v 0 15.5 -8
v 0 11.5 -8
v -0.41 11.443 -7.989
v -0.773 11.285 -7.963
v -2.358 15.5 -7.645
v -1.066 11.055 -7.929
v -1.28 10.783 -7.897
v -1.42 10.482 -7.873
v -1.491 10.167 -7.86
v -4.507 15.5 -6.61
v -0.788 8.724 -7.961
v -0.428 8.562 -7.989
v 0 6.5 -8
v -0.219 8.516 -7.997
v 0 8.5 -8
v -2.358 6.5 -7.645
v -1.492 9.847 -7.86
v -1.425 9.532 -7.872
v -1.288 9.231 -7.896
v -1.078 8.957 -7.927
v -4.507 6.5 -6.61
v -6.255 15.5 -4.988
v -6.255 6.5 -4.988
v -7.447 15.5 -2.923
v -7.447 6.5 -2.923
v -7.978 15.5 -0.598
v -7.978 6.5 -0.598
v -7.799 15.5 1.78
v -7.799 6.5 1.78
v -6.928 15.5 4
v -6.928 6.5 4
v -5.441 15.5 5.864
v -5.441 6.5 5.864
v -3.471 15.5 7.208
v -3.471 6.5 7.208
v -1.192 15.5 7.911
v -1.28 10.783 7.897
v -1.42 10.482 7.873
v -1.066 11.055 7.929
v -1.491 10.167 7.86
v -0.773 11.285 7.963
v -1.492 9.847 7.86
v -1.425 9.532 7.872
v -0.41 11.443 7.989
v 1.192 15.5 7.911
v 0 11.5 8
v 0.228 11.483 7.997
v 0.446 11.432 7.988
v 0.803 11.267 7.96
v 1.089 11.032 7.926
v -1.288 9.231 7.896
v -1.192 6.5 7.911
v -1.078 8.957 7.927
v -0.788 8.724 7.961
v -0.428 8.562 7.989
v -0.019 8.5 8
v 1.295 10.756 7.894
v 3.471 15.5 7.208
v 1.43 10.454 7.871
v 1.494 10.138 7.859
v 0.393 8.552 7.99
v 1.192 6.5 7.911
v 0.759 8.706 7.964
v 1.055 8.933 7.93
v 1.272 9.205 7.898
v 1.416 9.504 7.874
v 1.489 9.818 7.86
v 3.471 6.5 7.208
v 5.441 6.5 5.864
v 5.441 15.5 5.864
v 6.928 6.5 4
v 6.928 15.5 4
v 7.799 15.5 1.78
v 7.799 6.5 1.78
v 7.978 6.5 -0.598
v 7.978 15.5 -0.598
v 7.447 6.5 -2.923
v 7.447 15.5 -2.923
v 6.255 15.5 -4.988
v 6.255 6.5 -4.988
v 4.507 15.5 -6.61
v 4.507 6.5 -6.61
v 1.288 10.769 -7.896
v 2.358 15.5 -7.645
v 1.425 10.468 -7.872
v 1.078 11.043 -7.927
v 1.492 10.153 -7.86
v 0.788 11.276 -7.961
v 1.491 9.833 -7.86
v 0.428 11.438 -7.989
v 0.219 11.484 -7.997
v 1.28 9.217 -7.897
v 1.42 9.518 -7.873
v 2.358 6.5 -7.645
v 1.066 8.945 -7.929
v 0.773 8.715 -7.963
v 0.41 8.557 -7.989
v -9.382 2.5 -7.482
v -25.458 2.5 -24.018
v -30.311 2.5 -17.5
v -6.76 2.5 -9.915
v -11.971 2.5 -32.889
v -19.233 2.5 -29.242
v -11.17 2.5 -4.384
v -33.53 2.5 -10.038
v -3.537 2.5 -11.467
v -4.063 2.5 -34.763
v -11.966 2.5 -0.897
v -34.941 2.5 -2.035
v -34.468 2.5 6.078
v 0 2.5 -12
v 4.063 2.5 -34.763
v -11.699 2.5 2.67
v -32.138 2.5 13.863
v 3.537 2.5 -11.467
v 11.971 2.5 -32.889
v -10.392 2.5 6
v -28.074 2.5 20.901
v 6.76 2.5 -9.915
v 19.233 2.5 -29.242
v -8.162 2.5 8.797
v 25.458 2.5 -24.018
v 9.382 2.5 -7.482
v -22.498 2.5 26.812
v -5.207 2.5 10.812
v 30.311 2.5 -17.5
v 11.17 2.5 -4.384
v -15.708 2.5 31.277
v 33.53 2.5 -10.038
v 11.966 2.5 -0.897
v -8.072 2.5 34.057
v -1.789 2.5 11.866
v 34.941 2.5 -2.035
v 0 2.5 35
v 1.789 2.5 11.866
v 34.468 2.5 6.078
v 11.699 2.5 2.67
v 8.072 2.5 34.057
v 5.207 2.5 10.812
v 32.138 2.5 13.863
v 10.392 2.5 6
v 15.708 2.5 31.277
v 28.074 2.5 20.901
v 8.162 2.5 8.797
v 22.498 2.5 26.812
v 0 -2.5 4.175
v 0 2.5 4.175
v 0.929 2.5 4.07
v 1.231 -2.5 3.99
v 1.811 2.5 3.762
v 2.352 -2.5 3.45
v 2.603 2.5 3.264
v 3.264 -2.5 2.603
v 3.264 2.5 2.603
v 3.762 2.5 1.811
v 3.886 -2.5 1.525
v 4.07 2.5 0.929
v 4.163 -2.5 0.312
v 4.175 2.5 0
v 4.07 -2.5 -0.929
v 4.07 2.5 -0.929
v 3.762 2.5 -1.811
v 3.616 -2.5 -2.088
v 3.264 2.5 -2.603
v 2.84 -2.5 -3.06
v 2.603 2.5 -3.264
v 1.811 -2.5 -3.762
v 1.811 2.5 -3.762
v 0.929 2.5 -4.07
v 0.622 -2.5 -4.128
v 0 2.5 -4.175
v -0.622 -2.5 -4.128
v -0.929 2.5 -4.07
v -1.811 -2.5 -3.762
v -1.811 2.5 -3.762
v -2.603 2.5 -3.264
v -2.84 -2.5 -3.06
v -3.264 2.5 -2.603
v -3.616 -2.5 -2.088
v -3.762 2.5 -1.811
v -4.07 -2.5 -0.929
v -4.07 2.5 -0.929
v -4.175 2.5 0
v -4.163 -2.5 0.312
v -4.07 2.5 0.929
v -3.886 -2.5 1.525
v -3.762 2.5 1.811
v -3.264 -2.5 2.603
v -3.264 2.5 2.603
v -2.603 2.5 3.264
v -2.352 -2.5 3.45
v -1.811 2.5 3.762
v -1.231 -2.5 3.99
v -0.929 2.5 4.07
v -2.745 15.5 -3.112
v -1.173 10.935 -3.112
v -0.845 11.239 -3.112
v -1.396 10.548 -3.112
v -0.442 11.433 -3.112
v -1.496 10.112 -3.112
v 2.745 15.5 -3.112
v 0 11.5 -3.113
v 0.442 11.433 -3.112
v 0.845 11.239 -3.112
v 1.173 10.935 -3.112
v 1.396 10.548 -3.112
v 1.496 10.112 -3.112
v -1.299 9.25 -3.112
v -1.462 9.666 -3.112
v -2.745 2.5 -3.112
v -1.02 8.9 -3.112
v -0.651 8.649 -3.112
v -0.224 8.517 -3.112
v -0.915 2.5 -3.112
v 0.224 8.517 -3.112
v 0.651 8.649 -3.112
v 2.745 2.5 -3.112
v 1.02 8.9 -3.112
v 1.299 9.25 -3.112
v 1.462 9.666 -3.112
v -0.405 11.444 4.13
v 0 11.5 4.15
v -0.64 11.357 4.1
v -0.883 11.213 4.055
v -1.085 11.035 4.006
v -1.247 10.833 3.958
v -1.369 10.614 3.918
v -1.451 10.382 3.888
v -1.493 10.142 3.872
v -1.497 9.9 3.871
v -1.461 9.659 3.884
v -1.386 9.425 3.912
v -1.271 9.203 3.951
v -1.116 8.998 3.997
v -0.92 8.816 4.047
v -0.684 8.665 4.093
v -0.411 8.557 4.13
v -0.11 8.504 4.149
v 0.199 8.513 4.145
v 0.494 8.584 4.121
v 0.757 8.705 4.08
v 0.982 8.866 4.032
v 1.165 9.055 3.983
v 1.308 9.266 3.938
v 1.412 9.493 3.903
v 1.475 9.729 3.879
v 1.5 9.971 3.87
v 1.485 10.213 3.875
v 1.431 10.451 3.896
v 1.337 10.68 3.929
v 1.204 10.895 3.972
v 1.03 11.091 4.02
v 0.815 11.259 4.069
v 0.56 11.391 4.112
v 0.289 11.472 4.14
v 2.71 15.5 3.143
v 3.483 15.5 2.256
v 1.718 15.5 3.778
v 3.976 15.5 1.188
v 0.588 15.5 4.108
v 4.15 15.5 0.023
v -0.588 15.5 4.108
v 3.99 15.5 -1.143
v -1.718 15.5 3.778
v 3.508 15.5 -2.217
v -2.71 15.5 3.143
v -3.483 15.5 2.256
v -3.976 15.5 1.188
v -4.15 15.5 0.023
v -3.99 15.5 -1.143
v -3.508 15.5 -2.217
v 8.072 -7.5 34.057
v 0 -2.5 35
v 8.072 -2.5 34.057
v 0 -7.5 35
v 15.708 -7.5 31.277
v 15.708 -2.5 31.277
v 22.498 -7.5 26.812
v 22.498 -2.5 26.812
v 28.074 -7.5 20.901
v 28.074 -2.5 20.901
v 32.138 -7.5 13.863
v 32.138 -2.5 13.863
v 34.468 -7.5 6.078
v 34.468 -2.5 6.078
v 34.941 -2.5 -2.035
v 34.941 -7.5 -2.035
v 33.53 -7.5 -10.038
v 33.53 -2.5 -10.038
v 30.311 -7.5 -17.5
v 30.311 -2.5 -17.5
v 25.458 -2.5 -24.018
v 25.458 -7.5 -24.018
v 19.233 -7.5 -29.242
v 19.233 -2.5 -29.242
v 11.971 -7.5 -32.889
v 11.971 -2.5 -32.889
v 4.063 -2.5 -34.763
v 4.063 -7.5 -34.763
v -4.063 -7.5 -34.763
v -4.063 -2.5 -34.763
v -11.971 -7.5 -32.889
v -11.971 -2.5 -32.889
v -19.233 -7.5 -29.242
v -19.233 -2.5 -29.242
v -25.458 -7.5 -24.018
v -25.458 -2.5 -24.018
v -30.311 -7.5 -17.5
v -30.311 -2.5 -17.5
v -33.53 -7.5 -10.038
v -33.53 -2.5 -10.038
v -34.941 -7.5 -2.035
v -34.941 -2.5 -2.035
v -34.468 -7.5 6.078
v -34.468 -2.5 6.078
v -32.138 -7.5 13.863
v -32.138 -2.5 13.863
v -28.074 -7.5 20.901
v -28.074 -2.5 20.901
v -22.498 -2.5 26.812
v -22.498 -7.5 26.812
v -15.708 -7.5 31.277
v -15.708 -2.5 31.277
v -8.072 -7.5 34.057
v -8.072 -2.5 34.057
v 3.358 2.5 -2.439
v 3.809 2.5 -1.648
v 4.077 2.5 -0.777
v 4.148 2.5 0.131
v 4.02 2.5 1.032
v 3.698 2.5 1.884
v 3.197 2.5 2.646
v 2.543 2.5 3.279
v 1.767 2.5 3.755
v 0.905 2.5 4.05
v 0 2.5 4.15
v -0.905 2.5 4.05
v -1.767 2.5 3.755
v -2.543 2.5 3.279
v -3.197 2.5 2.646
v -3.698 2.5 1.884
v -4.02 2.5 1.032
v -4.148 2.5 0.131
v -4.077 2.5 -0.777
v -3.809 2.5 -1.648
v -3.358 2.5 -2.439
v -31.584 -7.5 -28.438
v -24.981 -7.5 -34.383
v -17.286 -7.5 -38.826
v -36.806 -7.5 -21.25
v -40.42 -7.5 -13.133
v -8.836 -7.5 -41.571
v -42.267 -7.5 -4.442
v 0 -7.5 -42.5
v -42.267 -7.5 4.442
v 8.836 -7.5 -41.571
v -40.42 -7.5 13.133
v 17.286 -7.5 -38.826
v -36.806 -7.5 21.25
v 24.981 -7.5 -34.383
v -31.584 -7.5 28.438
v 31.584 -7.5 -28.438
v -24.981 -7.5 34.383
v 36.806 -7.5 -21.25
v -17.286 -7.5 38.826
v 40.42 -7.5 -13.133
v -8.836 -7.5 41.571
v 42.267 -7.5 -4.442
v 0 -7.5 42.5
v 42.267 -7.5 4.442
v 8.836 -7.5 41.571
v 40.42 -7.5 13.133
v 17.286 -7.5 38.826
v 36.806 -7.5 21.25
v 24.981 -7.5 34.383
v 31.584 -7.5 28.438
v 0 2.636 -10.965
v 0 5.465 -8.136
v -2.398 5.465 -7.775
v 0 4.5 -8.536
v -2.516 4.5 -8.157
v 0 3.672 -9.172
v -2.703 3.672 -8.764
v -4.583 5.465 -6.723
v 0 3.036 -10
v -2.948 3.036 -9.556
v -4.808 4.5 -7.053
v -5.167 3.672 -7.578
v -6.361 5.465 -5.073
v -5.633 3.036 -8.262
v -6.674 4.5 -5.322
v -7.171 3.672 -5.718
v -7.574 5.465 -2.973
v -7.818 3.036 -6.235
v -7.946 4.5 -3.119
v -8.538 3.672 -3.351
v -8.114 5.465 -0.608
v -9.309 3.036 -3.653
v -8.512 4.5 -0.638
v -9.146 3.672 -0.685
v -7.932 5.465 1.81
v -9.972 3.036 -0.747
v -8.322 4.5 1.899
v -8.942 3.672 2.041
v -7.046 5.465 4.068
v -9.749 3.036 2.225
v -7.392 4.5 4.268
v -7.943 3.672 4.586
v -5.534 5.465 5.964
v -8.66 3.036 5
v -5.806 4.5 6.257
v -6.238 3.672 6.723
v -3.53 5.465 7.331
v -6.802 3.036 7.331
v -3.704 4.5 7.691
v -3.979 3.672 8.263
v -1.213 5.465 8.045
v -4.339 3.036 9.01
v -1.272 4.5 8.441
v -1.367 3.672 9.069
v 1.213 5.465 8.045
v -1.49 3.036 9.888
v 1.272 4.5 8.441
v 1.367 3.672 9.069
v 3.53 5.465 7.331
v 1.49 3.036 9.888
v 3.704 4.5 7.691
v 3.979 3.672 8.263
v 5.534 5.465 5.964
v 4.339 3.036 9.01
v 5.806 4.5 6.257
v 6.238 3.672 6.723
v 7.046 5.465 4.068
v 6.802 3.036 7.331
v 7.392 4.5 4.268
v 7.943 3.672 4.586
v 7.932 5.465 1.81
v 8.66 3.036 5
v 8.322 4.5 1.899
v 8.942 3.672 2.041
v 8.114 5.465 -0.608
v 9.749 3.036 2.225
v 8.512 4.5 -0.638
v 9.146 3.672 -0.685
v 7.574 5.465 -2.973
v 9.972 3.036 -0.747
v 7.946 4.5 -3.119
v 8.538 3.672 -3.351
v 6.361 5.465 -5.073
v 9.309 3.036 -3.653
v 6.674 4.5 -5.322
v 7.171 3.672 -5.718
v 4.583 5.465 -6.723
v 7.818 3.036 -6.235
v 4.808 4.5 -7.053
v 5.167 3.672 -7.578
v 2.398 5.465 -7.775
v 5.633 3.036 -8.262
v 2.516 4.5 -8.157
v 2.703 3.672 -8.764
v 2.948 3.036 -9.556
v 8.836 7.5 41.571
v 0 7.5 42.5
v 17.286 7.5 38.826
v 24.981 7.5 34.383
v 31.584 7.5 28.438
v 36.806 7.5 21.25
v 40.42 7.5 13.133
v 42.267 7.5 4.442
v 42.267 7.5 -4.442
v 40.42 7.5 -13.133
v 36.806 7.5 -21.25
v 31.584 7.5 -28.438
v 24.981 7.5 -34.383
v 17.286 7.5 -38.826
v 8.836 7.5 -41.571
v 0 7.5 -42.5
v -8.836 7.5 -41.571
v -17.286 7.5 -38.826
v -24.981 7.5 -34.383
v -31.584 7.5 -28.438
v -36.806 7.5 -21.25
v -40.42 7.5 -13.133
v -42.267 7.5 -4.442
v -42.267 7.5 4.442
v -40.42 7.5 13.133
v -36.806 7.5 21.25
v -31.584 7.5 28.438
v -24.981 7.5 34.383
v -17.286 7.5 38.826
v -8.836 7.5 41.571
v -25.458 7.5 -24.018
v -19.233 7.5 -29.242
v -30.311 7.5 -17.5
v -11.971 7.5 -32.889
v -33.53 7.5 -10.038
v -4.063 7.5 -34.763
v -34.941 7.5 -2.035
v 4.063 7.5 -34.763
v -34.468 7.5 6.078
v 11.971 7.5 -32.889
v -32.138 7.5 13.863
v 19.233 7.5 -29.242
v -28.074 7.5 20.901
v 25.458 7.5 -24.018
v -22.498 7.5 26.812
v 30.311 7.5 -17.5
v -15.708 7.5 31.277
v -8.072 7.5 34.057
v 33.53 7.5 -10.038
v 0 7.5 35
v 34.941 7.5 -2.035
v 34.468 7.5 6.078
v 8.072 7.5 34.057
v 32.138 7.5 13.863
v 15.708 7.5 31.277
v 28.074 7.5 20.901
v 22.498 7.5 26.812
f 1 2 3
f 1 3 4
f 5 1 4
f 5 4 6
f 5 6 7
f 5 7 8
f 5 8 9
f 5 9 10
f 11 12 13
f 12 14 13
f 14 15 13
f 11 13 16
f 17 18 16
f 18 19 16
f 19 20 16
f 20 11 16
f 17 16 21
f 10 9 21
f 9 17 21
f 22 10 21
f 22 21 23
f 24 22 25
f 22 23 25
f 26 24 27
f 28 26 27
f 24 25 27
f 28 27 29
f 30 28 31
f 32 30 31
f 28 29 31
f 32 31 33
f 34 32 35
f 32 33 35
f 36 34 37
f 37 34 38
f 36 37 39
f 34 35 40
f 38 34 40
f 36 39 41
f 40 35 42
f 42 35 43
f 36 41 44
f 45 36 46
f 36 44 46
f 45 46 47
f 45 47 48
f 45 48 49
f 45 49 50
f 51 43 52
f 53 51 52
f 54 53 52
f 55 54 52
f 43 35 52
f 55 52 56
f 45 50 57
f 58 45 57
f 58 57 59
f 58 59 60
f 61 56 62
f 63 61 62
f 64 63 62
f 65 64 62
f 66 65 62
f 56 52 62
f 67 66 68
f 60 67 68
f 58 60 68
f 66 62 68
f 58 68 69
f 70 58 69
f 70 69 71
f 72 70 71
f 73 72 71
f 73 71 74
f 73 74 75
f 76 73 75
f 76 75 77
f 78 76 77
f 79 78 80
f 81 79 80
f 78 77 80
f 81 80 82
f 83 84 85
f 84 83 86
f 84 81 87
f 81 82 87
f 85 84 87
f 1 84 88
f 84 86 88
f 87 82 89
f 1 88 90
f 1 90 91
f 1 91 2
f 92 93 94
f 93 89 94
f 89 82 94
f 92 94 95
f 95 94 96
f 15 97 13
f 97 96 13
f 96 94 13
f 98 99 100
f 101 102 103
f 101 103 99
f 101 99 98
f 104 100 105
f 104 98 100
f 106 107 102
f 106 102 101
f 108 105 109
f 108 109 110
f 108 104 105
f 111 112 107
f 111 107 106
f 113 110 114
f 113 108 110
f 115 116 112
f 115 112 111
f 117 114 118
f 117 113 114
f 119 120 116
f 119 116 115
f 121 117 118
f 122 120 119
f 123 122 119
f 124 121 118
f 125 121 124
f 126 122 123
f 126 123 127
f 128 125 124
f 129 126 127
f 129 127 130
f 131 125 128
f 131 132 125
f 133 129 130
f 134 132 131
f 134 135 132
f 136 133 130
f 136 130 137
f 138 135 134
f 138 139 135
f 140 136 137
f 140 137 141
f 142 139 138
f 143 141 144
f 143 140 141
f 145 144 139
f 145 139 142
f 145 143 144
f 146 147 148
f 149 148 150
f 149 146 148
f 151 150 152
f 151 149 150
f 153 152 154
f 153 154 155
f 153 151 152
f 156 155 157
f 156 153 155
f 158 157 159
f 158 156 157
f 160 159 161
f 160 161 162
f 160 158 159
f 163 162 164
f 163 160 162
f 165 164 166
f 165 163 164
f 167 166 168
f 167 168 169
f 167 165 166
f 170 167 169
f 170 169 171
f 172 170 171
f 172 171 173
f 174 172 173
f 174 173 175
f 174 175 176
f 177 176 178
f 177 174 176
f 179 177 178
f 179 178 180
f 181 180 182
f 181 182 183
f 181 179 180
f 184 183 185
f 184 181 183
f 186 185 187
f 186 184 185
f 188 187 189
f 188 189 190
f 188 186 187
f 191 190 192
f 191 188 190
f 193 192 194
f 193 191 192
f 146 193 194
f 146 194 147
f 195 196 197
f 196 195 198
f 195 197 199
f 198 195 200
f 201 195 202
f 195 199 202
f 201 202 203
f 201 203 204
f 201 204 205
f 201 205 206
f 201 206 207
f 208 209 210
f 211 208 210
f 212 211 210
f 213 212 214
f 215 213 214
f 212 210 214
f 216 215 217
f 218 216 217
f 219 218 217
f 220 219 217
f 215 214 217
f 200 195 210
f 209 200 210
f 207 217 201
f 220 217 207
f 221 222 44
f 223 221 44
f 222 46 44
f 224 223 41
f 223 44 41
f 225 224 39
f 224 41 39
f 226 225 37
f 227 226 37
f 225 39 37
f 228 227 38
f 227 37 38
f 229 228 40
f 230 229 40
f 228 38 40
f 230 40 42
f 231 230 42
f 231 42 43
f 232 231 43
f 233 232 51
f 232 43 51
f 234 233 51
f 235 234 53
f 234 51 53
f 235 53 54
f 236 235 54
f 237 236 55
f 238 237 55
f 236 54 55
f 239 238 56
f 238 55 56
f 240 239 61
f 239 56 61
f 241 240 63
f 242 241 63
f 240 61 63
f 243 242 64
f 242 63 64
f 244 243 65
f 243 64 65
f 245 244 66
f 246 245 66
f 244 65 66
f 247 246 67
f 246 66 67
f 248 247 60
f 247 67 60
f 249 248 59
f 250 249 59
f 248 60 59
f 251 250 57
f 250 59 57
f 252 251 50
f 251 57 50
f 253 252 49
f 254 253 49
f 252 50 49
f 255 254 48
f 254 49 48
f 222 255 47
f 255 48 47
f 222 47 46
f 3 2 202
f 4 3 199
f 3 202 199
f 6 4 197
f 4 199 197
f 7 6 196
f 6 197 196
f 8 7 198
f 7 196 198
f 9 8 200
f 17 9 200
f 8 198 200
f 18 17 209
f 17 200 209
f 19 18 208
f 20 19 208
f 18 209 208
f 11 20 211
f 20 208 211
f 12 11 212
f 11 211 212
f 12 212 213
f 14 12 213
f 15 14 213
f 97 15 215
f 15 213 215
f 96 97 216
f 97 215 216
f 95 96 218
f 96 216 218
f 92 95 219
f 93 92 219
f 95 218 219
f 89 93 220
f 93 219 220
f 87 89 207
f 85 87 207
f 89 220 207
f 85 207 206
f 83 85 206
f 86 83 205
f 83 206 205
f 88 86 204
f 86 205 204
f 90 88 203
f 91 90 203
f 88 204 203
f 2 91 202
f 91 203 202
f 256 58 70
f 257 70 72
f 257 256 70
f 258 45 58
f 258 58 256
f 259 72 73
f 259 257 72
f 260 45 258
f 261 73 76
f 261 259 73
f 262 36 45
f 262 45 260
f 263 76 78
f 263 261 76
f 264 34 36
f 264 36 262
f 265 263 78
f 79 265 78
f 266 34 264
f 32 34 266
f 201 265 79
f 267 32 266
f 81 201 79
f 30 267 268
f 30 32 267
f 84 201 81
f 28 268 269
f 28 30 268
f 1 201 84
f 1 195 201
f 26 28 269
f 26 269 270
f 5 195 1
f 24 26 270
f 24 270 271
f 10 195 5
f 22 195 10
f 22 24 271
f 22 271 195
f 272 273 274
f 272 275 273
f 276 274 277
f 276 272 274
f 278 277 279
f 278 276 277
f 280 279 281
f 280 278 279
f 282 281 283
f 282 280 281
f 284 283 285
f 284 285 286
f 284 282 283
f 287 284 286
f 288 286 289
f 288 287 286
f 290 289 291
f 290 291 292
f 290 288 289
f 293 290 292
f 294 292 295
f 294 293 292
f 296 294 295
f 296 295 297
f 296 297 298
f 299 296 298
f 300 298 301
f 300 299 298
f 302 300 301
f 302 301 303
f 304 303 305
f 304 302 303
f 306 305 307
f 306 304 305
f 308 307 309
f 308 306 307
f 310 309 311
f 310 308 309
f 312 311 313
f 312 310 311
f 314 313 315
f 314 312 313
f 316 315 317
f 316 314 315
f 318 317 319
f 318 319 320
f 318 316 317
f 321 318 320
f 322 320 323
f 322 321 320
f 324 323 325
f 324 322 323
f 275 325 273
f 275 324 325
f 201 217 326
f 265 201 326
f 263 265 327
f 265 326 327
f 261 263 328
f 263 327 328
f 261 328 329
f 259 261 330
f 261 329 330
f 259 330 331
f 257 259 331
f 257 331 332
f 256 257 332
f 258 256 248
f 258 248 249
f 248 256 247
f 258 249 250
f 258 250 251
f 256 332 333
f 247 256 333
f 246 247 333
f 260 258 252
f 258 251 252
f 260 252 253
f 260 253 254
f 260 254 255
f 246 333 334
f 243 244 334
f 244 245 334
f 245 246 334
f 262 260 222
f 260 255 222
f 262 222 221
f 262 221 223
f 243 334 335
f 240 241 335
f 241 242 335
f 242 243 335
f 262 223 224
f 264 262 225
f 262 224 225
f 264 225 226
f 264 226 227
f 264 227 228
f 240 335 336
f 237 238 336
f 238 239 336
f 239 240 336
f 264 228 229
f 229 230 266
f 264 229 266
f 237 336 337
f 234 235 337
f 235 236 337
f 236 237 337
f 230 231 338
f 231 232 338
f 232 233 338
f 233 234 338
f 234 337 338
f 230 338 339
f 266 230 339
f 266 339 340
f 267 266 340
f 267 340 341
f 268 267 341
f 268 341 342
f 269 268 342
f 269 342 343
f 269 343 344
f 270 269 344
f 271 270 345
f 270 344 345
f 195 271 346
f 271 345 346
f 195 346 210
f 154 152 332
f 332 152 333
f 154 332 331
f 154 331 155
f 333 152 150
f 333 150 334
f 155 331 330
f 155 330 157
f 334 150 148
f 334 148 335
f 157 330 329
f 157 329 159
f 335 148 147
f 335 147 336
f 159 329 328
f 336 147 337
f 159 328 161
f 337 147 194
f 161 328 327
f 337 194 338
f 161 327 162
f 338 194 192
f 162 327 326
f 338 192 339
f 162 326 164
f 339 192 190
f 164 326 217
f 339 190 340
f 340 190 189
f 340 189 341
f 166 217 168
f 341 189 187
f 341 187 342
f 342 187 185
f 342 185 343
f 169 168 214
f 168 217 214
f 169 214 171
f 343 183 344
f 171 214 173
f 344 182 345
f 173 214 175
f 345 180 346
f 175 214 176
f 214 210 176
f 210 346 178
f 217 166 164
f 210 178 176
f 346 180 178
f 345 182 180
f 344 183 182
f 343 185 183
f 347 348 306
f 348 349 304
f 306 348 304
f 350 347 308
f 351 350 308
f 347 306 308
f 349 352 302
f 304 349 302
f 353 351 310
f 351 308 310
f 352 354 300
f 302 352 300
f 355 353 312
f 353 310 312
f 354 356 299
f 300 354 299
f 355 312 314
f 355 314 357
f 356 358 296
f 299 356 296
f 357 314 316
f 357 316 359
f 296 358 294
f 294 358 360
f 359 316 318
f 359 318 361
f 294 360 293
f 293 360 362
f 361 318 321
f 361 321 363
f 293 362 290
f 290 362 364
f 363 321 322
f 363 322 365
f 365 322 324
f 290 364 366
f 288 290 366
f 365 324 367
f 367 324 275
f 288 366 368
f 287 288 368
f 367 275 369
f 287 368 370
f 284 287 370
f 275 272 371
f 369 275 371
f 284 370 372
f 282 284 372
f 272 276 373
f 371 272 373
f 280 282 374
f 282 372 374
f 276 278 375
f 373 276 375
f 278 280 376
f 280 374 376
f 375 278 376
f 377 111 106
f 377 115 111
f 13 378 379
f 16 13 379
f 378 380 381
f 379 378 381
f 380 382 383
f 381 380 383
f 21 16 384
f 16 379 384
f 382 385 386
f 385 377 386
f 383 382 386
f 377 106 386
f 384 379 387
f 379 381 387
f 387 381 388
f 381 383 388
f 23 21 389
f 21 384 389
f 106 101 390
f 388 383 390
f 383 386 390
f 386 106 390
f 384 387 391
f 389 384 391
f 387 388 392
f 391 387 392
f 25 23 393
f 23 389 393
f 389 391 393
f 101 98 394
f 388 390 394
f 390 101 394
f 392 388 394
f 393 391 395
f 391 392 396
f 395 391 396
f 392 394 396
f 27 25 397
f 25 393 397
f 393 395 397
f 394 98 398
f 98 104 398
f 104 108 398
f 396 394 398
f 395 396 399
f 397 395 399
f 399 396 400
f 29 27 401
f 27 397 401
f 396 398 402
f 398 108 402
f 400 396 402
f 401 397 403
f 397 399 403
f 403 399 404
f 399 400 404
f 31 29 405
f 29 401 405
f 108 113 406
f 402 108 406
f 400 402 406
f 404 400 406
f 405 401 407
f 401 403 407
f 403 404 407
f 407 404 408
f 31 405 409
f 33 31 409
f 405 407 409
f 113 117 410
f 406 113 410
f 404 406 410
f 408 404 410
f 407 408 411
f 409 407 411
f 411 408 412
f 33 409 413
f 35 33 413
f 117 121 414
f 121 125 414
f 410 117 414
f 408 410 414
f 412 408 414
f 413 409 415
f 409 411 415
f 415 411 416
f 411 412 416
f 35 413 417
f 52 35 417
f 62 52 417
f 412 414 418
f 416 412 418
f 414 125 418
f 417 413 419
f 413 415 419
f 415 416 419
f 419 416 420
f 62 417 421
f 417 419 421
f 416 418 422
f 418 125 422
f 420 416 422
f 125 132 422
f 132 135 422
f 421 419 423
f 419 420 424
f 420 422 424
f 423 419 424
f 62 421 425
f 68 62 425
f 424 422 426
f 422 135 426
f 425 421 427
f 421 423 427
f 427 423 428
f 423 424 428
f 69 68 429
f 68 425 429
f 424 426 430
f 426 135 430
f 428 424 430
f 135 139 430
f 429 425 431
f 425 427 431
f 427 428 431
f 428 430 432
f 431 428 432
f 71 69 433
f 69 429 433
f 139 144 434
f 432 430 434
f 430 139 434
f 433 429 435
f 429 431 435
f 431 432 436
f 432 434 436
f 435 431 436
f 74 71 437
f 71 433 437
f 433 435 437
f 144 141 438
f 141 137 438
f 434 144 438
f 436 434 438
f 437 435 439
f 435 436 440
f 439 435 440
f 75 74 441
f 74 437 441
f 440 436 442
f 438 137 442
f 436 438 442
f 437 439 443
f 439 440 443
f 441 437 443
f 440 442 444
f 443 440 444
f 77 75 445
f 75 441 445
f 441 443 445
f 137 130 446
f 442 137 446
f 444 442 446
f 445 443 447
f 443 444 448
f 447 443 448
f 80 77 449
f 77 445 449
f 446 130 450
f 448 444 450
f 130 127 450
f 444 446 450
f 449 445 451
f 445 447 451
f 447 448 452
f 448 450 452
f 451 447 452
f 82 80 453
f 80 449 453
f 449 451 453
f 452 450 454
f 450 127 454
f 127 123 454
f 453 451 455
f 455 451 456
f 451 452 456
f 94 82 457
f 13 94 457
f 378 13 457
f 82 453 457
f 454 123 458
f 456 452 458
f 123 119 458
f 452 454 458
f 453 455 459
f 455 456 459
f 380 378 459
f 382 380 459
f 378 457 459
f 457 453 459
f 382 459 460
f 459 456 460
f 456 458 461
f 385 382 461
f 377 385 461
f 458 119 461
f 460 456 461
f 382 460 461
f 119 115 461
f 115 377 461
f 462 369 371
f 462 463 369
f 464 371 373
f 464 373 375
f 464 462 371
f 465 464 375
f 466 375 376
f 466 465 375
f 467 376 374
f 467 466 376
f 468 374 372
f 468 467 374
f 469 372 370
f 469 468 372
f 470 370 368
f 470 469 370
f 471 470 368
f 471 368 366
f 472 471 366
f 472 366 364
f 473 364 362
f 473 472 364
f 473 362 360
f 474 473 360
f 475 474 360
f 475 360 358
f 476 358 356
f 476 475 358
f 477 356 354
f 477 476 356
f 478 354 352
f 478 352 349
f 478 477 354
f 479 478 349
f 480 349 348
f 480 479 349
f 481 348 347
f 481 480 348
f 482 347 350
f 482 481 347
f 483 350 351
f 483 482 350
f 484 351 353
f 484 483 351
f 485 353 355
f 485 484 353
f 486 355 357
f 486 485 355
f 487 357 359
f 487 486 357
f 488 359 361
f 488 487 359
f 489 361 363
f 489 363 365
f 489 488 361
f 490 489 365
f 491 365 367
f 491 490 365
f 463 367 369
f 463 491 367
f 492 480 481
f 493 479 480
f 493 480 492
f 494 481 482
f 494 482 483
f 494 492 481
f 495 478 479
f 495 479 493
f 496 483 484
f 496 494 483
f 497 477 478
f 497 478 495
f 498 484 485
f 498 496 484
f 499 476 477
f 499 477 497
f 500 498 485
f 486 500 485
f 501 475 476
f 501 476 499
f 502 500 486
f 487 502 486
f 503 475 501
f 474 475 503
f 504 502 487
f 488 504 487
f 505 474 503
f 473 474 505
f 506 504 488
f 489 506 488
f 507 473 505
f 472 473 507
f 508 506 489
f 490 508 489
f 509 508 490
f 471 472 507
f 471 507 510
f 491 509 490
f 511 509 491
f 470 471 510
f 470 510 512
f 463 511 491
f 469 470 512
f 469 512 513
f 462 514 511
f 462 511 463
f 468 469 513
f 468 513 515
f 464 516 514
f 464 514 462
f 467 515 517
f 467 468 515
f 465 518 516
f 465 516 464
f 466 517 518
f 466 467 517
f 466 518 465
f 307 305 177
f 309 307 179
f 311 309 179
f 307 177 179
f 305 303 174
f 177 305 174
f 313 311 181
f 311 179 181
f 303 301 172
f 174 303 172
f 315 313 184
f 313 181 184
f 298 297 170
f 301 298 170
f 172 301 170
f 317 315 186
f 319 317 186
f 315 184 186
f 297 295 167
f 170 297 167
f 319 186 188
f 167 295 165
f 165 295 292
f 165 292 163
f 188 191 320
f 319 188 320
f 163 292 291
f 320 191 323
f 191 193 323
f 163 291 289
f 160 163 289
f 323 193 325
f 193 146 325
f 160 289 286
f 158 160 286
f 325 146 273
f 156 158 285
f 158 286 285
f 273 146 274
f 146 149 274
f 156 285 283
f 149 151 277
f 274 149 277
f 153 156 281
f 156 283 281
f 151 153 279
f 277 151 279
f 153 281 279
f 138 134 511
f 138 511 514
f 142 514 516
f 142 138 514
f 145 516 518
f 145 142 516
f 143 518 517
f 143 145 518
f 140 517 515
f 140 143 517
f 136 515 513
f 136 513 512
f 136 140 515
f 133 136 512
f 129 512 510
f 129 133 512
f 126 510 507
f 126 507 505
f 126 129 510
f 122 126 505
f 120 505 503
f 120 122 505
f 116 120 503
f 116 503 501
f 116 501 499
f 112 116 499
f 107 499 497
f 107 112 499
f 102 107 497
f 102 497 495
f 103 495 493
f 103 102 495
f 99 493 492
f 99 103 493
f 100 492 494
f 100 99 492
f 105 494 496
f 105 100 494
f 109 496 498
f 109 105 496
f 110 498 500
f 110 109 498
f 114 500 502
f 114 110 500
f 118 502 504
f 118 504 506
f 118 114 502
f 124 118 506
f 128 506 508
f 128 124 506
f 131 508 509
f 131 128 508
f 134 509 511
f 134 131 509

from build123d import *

# Parameters (mm, degrees)
SKETCH1_R           = 35
SKETCH1_R_2         = 4.175
BOSS_EXTRUDE1_DEPTH = 2.5
SKETCH1_3_R         = 42.5
SKETCH1_3_R_2       = 35
BOSS_EXTRUDE2_DEPTH = 7.5
SKETCH2_R           = 8
BOSS_EXTRUDE3_DEPTH = 13
FILLET1_R           = 4
SKETCH3_R           = 1.5
CUT_EXTRUDE1_DEPTH  = 12.5


with BuildPart() as part:
    # Sketch1 → Boss-Extrude1 (new, symmetric)
    with BuildSketch(Plane(origin=(0, 0, 0), x_dir=(1, 0, 0), z_dir=(0, 1, 0))):
        Circle(SKETCH1_R)
        Circle(SKETCH1_R_2, mode=Mode.SUBTRACT)
    extrude(amount=BOSS_EXTRUDE1_DEPTH, both=True)

    # Sketch1<3> → Boss-Extrude2 (add, symmetric)
    with BuildSketch(Plane(origin=(0, 0, 0), x_dir=(1, 0, 0), z_dir=(0, 1, 0))):
        Circle(SKETCH1_3_R)
        Circle(SKETCH1_3_R_2, mode=Mode.SUBTRACT)
    extrude(amount=BOSS_EXTRUDE2_DEPTH, both=True)

    # Sketch2 → Boss-Extrude3 (add)
    with BuildSketch(Plane(origin=(0, 2.5, 0), x_dir=(1, 0, 0), z_dir=(0, 1, 0))):
        Circle(SKETCH2_R)
        with BuildLine():
            Line((-2.744966985, 3.1125), (2.744966985, 3.1125))
            ThreePointArc((2.744966985, 3.1125), (0, -4.15), (-2.744966985, 3.1125))
        make_face(mode=Mode.SUBTRACT)
    extrude(amount=BOSS_EXTRUDE3_DEPTH)

    # Fillet1
    fillet1_edges = [part.edges().sort_by_distance(p)[0] for p in [
        (-8, 2.5, 0),
    ]]
    fillet(fillet1_edges, radius=FILLET1_R)

    # Sketch3 → Cut-Extrude1 (cut, symmetric)
    with BuildSketch(Plane.XY):
        with Locations((0, 10)):
            Circle(SKETCH3_R)
    extrude(amount=CUT_EXTRUDE1_DEPTH, both=True, mode=Mode.SUBTRACT)


solid = part.part
